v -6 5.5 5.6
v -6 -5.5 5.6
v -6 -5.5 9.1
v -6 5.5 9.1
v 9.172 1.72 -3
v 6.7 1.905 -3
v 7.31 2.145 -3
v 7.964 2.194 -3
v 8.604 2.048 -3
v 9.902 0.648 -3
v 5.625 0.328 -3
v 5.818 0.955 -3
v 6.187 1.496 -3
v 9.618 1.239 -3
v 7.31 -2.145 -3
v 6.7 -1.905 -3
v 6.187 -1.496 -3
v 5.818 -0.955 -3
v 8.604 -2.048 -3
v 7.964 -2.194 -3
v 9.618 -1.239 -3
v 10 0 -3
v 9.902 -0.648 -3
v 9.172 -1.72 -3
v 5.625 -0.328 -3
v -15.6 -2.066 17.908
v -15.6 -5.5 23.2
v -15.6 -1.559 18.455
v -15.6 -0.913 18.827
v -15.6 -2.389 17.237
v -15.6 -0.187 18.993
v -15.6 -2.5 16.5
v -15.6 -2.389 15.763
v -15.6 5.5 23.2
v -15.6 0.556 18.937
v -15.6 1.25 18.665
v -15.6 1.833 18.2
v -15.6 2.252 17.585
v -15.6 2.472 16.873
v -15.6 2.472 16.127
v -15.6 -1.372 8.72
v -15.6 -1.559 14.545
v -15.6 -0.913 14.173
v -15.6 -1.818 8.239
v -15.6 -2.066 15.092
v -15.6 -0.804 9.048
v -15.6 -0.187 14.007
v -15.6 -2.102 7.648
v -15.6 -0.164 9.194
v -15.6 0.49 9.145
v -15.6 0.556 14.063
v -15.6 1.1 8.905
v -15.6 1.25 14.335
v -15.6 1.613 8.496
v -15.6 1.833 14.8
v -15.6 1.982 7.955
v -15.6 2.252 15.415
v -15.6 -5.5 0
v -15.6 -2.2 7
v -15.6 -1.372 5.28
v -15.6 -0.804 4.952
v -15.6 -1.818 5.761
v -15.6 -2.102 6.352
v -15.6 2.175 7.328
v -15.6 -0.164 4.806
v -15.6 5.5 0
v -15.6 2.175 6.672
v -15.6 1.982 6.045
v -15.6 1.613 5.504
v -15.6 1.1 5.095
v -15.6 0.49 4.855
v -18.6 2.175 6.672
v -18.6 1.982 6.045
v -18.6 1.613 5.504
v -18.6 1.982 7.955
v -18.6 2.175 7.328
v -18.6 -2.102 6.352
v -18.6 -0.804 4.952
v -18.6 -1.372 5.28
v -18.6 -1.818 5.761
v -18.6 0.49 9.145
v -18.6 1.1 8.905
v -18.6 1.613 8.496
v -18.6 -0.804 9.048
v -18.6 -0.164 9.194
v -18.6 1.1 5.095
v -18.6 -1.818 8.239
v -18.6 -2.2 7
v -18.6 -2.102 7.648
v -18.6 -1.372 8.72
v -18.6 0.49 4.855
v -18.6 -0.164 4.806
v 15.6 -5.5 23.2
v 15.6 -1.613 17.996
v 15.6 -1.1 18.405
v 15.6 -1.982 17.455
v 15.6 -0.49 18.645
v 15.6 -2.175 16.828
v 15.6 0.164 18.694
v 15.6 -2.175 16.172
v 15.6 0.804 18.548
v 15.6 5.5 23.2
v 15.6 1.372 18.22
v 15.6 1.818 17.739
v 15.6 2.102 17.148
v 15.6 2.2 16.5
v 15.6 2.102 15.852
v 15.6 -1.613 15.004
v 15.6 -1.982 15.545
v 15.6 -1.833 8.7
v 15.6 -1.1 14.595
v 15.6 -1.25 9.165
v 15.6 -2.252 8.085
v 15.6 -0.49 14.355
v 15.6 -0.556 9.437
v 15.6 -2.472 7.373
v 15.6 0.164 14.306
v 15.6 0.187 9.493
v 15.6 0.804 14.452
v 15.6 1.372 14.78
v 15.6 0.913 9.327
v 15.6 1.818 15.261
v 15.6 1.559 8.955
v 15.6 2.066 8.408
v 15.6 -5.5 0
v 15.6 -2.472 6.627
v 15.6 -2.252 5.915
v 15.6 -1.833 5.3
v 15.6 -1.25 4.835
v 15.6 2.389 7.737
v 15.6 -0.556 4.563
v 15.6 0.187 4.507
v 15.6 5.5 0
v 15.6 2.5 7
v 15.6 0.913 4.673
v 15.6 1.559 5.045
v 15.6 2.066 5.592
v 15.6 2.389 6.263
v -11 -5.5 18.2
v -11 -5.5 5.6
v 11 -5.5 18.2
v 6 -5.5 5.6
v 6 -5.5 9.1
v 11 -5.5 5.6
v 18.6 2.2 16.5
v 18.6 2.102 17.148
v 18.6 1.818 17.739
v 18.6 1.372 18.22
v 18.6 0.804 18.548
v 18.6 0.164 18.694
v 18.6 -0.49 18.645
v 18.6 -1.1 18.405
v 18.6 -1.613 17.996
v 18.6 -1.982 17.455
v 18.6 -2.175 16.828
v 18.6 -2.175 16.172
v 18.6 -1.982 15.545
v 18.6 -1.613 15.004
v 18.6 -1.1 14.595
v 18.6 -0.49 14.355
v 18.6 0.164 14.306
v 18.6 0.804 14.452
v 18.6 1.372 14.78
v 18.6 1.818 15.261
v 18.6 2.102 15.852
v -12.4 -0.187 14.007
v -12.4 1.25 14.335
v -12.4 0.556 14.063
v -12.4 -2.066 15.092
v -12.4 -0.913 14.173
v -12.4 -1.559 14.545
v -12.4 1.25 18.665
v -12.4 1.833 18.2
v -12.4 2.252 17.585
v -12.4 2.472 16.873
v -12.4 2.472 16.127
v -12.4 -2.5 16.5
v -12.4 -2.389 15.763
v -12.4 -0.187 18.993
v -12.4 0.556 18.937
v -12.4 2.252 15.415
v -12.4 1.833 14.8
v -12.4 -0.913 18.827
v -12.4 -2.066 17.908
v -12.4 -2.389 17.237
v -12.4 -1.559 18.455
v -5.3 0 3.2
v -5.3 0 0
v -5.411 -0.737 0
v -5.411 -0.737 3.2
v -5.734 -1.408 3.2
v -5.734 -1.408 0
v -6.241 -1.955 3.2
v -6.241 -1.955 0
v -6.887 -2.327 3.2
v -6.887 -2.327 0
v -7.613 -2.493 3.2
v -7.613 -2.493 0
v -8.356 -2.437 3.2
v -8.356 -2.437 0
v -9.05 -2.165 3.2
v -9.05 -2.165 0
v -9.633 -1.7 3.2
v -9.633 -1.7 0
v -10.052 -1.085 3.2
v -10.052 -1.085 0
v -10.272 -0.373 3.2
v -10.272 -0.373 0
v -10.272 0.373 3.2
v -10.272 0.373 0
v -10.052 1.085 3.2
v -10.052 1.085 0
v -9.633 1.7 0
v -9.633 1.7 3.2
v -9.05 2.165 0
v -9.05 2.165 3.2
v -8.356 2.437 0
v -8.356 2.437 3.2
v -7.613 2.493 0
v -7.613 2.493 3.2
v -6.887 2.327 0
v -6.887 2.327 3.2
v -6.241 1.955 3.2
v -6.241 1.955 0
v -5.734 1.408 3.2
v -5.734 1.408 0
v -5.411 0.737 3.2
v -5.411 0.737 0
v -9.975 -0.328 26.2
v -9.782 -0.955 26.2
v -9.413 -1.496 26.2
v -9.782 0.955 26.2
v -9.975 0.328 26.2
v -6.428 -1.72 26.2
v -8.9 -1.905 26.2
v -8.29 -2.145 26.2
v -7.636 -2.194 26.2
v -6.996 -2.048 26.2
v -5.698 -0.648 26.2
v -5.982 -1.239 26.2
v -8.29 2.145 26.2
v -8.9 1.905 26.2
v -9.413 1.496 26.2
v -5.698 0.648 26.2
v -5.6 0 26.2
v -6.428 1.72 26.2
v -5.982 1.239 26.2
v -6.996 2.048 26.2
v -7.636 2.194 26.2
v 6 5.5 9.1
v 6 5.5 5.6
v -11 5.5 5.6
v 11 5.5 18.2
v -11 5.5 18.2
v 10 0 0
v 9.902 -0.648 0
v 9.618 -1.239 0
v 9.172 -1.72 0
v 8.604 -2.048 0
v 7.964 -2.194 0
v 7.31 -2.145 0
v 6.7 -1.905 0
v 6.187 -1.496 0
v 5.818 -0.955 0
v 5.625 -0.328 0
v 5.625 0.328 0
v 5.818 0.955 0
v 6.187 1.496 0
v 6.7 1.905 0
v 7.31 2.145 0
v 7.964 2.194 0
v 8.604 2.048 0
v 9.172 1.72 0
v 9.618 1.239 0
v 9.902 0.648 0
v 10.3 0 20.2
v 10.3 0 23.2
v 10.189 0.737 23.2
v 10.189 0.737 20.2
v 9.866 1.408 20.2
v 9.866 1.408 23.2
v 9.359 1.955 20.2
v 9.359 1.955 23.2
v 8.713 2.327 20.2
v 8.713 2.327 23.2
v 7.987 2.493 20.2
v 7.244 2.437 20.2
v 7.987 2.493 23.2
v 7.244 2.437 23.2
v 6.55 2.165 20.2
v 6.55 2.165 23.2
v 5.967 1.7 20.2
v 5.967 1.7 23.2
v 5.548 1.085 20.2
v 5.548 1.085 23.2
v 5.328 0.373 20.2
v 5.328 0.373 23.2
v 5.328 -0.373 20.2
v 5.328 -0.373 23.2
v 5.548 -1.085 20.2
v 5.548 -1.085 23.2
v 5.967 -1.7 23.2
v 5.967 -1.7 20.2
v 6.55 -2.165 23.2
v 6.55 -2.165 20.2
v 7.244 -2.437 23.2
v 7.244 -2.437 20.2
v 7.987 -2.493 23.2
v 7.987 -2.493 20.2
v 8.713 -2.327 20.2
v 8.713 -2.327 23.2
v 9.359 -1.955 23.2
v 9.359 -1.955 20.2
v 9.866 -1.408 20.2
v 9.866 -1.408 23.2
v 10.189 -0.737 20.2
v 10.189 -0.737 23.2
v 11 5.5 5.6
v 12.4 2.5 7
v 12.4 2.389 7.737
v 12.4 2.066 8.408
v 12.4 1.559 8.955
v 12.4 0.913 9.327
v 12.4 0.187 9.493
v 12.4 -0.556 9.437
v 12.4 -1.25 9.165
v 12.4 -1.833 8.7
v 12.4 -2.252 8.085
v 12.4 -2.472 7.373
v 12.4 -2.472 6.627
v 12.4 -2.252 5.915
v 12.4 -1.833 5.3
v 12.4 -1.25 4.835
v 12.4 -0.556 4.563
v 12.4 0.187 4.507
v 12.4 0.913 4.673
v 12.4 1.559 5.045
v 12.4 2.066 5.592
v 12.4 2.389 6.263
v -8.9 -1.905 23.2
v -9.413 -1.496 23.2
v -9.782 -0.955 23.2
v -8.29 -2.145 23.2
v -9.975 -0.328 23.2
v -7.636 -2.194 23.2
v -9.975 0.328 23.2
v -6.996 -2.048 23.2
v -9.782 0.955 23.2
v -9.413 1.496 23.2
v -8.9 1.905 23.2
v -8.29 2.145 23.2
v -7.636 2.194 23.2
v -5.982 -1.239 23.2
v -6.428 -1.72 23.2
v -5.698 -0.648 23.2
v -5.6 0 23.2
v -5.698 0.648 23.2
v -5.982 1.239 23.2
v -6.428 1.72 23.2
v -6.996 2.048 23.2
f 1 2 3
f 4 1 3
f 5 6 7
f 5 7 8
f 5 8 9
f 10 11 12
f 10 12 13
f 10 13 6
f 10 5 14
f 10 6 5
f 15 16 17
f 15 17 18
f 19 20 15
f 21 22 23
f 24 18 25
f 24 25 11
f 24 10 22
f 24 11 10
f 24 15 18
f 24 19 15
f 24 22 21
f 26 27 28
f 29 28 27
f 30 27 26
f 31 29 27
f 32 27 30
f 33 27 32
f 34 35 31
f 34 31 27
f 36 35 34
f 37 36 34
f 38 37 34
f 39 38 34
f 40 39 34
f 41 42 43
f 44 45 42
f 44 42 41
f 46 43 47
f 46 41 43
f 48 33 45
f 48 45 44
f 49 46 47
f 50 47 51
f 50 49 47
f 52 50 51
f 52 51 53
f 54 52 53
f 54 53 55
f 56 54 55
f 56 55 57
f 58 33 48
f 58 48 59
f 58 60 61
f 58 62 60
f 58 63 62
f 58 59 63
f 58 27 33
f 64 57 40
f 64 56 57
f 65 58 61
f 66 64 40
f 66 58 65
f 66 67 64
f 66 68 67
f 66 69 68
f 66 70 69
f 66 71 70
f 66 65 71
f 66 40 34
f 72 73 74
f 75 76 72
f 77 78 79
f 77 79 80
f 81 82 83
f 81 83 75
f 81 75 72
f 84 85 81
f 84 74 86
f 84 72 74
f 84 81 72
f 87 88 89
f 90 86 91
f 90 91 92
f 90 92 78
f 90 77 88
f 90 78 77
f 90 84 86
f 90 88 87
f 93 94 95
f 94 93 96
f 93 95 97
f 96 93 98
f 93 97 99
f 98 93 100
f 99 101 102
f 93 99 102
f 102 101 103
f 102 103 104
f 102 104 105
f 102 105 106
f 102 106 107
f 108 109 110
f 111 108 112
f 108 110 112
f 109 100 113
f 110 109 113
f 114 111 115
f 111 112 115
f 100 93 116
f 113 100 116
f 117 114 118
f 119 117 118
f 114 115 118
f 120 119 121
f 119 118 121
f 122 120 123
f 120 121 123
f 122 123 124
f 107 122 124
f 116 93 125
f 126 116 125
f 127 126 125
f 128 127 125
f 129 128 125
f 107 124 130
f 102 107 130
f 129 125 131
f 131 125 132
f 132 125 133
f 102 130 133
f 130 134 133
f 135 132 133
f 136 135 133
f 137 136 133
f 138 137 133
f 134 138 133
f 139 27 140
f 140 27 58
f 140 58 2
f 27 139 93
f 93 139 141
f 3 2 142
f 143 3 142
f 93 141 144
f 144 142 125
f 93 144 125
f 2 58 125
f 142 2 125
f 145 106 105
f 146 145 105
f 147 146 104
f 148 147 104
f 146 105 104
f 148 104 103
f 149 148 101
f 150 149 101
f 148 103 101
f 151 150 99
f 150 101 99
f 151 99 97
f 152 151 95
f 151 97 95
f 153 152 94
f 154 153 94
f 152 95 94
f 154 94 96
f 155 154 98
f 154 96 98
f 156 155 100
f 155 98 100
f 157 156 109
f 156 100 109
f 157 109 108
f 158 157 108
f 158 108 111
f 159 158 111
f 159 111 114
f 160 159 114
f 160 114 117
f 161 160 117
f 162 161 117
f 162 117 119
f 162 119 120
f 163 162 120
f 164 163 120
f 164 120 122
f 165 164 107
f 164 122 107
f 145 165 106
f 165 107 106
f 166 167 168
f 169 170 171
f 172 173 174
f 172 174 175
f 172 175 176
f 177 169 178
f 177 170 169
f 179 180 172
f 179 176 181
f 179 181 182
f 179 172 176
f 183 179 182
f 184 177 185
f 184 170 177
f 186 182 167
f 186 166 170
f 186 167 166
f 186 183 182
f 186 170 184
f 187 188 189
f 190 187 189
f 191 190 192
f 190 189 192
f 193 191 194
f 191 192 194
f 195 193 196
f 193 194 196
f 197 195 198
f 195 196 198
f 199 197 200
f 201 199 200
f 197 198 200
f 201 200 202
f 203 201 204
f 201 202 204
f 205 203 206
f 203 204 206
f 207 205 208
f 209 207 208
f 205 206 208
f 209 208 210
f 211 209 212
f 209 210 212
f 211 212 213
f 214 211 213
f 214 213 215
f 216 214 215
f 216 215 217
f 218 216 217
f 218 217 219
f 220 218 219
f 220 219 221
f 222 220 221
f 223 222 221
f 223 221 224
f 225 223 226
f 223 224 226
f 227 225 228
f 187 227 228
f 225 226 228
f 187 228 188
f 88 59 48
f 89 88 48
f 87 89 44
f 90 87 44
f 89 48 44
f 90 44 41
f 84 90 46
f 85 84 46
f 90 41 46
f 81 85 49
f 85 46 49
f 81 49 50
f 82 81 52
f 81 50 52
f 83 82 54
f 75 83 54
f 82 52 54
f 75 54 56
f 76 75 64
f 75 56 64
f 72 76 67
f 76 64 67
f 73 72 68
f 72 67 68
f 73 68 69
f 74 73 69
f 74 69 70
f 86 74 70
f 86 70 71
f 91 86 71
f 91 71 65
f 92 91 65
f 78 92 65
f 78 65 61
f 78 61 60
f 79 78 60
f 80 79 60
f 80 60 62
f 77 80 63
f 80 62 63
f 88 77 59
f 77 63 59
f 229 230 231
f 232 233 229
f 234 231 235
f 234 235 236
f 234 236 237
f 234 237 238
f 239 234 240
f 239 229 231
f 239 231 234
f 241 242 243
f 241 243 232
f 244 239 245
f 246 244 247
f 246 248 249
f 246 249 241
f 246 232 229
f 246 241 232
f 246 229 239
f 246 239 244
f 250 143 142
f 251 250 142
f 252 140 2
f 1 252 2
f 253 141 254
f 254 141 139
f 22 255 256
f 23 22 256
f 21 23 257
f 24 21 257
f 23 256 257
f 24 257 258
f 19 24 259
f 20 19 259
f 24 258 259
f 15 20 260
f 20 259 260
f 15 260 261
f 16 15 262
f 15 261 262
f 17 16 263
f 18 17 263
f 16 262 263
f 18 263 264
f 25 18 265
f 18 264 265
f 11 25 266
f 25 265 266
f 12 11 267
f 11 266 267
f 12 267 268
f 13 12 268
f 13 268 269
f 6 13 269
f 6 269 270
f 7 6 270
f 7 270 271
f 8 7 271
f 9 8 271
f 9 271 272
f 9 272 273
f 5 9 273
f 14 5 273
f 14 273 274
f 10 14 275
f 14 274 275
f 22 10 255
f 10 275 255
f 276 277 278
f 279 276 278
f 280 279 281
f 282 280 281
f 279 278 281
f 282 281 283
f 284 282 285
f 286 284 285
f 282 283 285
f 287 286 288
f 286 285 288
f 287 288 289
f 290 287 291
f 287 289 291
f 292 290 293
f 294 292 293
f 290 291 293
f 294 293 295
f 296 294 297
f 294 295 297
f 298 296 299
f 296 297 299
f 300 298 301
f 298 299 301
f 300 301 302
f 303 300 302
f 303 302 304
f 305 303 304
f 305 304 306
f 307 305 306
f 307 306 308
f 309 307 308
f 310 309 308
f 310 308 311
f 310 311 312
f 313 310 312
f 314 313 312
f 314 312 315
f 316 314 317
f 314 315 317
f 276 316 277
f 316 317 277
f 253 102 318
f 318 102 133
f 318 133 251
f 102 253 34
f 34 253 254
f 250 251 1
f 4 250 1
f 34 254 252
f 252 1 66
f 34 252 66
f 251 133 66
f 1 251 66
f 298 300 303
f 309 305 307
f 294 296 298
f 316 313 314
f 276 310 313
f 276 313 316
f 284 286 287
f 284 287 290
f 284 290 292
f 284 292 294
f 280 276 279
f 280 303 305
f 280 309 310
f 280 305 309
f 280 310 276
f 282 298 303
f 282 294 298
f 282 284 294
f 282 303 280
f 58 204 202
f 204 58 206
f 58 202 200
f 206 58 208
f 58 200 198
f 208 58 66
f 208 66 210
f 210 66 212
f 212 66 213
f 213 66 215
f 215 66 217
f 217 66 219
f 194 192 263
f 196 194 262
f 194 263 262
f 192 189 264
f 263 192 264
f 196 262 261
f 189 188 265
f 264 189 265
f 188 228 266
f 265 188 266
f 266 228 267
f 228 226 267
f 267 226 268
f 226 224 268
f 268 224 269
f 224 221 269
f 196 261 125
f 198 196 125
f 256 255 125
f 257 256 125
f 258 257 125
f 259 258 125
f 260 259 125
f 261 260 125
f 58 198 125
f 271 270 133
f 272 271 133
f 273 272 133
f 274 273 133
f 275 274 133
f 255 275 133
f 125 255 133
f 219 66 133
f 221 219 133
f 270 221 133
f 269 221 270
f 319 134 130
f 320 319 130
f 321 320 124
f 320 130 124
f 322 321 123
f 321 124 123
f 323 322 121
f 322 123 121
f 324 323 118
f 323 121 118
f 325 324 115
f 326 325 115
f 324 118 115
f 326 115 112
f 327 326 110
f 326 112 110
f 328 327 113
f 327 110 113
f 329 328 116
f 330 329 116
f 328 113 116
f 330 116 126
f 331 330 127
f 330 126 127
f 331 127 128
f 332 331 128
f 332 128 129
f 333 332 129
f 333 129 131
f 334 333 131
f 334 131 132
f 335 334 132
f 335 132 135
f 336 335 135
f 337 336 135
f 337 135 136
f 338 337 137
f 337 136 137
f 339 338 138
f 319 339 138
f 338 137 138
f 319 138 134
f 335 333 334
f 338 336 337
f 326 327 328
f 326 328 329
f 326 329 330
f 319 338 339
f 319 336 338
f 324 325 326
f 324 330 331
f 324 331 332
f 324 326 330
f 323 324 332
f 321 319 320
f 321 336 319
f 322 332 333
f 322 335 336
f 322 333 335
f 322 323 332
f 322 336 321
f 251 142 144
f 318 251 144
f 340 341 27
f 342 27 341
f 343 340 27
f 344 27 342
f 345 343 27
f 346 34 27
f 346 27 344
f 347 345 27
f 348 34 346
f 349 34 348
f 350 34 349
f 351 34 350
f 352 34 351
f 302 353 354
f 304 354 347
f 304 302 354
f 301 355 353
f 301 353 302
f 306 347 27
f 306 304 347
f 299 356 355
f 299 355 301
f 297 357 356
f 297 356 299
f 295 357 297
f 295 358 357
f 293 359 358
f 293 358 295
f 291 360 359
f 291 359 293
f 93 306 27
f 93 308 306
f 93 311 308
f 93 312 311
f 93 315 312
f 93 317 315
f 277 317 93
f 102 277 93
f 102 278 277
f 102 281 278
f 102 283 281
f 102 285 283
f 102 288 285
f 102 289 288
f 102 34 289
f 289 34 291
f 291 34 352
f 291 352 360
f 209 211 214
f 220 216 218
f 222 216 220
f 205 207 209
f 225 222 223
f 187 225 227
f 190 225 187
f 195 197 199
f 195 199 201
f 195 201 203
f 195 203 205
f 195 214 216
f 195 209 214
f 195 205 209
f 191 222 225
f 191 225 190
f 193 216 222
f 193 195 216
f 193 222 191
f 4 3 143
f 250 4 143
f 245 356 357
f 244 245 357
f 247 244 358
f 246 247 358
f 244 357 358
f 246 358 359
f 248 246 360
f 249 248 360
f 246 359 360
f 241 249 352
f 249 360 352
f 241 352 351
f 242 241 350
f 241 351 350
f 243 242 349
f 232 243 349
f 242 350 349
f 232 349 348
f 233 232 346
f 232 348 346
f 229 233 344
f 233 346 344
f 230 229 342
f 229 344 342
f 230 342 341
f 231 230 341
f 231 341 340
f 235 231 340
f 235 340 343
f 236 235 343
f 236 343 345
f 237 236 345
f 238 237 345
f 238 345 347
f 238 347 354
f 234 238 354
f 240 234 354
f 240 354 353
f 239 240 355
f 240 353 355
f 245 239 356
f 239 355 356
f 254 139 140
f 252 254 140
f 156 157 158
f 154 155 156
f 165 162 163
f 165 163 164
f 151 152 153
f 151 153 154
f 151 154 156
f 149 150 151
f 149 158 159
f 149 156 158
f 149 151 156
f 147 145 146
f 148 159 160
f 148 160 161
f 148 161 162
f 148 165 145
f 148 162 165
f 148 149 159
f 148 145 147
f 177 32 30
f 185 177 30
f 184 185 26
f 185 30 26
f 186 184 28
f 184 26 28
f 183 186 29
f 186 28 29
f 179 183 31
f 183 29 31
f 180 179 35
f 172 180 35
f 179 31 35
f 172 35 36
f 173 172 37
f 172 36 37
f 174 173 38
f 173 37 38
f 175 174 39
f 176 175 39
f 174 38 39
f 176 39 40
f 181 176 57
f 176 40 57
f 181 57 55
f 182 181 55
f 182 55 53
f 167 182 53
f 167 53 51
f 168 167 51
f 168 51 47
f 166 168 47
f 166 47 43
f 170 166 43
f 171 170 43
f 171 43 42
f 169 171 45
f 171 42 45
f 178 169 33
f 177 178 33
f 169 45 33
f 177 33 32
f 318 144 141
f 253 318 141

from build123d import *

# Parameters (mm, degrees)
F0_W      = 15.6
F0_H      = 11
F1_DEPTH  = 23.2
F3_DEPTH  = 25
F4_R      = 2.5
F5_DEPTH  = 3.2
F6_R      = 2.2
F7_DEPTH  = 3
F8_R      = 2.2
F9_DEPTH  = 3
F10_R     = 2.5
F11_DEPTH = 3
F13_R     = 2.2
F14_DEPTH = 3
F12_R     = 2.5
F15_DEPTH = 3.2
F16_R     = 2.5
F18_DEPTH = 3.2
F17_R     = 2.2
F19_DEPTH = 3


# Not quite as in the source:
# - a feature names something its author has since deleted; it is built from what else it names


with BuildPart() as f1:
    # F0 (on Top) → F1 (new body)
    with BuildSketch(Plane.XY):
        with Locations((-7.8, 0)):
            Rectangle(F0_W, F0_H)
        with Locations((7.8, 0)):
            Rectangle(F0_W, F0_H)
    extrude(amount=F1_DEPTH)

    # F2 (on face) → F3 (cut)
    with BuildSketch(Plane.XZ.offset(5.5)):
        Polygon((0, 18.2), (-11, 18.2), (-11, 5.6), (-6, 5.6), (-6, 9.1), (0, 9.1), (6, 9.1), (6, 5.6), (11, 5.6), (11, 18.2), align=None)
    extrude(amount=-F3_DEPTH, mode=Mode.SUBTRACT)

    # F4 (on face) → F5 (cut)
    with BuildSketch(Plane(origin=(0, 0, 0), x_dir=(1, 0, 0), z_dir=(0, 0, -1))):
        with Locations((-7.8, 0)):
            Circle(F4_R)
    extrude(amount=-F5_DEPTH, mode=Mode.SUBTRACT)

    # F6 (on face) → F7 (join)
    with BuildSketch(Plane(origin=(0, 0, 0), x_dir=(1, 0, 0), z_dir=(0, 0, -1))):
        with Locations((7.8, 0)):
            Circle(F6_R)
    extrude(amount=F7_DEPTH)

    # F8 (on face) → F9 (join)
    with BuildSketch(Plane.XY.offset(23.2)):
        with Locations((-7.8, 0)):
            Circle(F8_R)
    extrude(amount=F9_DEPTH)

    # F10 (on face) → F11 (cut)
    with BuildSketch(Plane.XY.offset(23.2)):
        with Locations((7.8, 0)):
            Circle(F10_R)
    extrude(amount=-F11_DEPTH, mode=Mode.SUBTRACT)

    # F13 (on face) → F14 (join)
    with BuildSketch(Plane.YZ.offset(15.6)):
        with Locations((0, 16.5)):
            Circle(F13_R)
    extrude(amount=F14_DEPTH)

    # F12 (on face) → F15 (cut)
    with BuildSketch(Plane.YZ.offset(15.6)):
        with Locations((0, 7)):
            Circle(F12_R)
    extrude(amount=-F15_DEPTH, mode=Mode.SUBTRACT)

    # F16 (on face) → F18 (cut)
    with BuildSketch(Plane(origin=(-15.6, 0, 0), x_dir=(0, -1, 0), z_dir=(-1, 0, 0))):
        with Locations((0, 16.5)):
            Circle(F16_R)
    extrude(amount=-F18_DEPTH, mode=Mode.SUBTRACT)

    # F17 (on face) → F19 (join)
    with BuildSketch(Plane(origin=(-15.6, 0, 0), x_dir=(0, -1, 0), z_dir=(-1, 0, 0))):
        with Locations((0, 7)):
            Circle(F17_R)
    extrude(amount=F19_DEPTH)


solid = f1.part
